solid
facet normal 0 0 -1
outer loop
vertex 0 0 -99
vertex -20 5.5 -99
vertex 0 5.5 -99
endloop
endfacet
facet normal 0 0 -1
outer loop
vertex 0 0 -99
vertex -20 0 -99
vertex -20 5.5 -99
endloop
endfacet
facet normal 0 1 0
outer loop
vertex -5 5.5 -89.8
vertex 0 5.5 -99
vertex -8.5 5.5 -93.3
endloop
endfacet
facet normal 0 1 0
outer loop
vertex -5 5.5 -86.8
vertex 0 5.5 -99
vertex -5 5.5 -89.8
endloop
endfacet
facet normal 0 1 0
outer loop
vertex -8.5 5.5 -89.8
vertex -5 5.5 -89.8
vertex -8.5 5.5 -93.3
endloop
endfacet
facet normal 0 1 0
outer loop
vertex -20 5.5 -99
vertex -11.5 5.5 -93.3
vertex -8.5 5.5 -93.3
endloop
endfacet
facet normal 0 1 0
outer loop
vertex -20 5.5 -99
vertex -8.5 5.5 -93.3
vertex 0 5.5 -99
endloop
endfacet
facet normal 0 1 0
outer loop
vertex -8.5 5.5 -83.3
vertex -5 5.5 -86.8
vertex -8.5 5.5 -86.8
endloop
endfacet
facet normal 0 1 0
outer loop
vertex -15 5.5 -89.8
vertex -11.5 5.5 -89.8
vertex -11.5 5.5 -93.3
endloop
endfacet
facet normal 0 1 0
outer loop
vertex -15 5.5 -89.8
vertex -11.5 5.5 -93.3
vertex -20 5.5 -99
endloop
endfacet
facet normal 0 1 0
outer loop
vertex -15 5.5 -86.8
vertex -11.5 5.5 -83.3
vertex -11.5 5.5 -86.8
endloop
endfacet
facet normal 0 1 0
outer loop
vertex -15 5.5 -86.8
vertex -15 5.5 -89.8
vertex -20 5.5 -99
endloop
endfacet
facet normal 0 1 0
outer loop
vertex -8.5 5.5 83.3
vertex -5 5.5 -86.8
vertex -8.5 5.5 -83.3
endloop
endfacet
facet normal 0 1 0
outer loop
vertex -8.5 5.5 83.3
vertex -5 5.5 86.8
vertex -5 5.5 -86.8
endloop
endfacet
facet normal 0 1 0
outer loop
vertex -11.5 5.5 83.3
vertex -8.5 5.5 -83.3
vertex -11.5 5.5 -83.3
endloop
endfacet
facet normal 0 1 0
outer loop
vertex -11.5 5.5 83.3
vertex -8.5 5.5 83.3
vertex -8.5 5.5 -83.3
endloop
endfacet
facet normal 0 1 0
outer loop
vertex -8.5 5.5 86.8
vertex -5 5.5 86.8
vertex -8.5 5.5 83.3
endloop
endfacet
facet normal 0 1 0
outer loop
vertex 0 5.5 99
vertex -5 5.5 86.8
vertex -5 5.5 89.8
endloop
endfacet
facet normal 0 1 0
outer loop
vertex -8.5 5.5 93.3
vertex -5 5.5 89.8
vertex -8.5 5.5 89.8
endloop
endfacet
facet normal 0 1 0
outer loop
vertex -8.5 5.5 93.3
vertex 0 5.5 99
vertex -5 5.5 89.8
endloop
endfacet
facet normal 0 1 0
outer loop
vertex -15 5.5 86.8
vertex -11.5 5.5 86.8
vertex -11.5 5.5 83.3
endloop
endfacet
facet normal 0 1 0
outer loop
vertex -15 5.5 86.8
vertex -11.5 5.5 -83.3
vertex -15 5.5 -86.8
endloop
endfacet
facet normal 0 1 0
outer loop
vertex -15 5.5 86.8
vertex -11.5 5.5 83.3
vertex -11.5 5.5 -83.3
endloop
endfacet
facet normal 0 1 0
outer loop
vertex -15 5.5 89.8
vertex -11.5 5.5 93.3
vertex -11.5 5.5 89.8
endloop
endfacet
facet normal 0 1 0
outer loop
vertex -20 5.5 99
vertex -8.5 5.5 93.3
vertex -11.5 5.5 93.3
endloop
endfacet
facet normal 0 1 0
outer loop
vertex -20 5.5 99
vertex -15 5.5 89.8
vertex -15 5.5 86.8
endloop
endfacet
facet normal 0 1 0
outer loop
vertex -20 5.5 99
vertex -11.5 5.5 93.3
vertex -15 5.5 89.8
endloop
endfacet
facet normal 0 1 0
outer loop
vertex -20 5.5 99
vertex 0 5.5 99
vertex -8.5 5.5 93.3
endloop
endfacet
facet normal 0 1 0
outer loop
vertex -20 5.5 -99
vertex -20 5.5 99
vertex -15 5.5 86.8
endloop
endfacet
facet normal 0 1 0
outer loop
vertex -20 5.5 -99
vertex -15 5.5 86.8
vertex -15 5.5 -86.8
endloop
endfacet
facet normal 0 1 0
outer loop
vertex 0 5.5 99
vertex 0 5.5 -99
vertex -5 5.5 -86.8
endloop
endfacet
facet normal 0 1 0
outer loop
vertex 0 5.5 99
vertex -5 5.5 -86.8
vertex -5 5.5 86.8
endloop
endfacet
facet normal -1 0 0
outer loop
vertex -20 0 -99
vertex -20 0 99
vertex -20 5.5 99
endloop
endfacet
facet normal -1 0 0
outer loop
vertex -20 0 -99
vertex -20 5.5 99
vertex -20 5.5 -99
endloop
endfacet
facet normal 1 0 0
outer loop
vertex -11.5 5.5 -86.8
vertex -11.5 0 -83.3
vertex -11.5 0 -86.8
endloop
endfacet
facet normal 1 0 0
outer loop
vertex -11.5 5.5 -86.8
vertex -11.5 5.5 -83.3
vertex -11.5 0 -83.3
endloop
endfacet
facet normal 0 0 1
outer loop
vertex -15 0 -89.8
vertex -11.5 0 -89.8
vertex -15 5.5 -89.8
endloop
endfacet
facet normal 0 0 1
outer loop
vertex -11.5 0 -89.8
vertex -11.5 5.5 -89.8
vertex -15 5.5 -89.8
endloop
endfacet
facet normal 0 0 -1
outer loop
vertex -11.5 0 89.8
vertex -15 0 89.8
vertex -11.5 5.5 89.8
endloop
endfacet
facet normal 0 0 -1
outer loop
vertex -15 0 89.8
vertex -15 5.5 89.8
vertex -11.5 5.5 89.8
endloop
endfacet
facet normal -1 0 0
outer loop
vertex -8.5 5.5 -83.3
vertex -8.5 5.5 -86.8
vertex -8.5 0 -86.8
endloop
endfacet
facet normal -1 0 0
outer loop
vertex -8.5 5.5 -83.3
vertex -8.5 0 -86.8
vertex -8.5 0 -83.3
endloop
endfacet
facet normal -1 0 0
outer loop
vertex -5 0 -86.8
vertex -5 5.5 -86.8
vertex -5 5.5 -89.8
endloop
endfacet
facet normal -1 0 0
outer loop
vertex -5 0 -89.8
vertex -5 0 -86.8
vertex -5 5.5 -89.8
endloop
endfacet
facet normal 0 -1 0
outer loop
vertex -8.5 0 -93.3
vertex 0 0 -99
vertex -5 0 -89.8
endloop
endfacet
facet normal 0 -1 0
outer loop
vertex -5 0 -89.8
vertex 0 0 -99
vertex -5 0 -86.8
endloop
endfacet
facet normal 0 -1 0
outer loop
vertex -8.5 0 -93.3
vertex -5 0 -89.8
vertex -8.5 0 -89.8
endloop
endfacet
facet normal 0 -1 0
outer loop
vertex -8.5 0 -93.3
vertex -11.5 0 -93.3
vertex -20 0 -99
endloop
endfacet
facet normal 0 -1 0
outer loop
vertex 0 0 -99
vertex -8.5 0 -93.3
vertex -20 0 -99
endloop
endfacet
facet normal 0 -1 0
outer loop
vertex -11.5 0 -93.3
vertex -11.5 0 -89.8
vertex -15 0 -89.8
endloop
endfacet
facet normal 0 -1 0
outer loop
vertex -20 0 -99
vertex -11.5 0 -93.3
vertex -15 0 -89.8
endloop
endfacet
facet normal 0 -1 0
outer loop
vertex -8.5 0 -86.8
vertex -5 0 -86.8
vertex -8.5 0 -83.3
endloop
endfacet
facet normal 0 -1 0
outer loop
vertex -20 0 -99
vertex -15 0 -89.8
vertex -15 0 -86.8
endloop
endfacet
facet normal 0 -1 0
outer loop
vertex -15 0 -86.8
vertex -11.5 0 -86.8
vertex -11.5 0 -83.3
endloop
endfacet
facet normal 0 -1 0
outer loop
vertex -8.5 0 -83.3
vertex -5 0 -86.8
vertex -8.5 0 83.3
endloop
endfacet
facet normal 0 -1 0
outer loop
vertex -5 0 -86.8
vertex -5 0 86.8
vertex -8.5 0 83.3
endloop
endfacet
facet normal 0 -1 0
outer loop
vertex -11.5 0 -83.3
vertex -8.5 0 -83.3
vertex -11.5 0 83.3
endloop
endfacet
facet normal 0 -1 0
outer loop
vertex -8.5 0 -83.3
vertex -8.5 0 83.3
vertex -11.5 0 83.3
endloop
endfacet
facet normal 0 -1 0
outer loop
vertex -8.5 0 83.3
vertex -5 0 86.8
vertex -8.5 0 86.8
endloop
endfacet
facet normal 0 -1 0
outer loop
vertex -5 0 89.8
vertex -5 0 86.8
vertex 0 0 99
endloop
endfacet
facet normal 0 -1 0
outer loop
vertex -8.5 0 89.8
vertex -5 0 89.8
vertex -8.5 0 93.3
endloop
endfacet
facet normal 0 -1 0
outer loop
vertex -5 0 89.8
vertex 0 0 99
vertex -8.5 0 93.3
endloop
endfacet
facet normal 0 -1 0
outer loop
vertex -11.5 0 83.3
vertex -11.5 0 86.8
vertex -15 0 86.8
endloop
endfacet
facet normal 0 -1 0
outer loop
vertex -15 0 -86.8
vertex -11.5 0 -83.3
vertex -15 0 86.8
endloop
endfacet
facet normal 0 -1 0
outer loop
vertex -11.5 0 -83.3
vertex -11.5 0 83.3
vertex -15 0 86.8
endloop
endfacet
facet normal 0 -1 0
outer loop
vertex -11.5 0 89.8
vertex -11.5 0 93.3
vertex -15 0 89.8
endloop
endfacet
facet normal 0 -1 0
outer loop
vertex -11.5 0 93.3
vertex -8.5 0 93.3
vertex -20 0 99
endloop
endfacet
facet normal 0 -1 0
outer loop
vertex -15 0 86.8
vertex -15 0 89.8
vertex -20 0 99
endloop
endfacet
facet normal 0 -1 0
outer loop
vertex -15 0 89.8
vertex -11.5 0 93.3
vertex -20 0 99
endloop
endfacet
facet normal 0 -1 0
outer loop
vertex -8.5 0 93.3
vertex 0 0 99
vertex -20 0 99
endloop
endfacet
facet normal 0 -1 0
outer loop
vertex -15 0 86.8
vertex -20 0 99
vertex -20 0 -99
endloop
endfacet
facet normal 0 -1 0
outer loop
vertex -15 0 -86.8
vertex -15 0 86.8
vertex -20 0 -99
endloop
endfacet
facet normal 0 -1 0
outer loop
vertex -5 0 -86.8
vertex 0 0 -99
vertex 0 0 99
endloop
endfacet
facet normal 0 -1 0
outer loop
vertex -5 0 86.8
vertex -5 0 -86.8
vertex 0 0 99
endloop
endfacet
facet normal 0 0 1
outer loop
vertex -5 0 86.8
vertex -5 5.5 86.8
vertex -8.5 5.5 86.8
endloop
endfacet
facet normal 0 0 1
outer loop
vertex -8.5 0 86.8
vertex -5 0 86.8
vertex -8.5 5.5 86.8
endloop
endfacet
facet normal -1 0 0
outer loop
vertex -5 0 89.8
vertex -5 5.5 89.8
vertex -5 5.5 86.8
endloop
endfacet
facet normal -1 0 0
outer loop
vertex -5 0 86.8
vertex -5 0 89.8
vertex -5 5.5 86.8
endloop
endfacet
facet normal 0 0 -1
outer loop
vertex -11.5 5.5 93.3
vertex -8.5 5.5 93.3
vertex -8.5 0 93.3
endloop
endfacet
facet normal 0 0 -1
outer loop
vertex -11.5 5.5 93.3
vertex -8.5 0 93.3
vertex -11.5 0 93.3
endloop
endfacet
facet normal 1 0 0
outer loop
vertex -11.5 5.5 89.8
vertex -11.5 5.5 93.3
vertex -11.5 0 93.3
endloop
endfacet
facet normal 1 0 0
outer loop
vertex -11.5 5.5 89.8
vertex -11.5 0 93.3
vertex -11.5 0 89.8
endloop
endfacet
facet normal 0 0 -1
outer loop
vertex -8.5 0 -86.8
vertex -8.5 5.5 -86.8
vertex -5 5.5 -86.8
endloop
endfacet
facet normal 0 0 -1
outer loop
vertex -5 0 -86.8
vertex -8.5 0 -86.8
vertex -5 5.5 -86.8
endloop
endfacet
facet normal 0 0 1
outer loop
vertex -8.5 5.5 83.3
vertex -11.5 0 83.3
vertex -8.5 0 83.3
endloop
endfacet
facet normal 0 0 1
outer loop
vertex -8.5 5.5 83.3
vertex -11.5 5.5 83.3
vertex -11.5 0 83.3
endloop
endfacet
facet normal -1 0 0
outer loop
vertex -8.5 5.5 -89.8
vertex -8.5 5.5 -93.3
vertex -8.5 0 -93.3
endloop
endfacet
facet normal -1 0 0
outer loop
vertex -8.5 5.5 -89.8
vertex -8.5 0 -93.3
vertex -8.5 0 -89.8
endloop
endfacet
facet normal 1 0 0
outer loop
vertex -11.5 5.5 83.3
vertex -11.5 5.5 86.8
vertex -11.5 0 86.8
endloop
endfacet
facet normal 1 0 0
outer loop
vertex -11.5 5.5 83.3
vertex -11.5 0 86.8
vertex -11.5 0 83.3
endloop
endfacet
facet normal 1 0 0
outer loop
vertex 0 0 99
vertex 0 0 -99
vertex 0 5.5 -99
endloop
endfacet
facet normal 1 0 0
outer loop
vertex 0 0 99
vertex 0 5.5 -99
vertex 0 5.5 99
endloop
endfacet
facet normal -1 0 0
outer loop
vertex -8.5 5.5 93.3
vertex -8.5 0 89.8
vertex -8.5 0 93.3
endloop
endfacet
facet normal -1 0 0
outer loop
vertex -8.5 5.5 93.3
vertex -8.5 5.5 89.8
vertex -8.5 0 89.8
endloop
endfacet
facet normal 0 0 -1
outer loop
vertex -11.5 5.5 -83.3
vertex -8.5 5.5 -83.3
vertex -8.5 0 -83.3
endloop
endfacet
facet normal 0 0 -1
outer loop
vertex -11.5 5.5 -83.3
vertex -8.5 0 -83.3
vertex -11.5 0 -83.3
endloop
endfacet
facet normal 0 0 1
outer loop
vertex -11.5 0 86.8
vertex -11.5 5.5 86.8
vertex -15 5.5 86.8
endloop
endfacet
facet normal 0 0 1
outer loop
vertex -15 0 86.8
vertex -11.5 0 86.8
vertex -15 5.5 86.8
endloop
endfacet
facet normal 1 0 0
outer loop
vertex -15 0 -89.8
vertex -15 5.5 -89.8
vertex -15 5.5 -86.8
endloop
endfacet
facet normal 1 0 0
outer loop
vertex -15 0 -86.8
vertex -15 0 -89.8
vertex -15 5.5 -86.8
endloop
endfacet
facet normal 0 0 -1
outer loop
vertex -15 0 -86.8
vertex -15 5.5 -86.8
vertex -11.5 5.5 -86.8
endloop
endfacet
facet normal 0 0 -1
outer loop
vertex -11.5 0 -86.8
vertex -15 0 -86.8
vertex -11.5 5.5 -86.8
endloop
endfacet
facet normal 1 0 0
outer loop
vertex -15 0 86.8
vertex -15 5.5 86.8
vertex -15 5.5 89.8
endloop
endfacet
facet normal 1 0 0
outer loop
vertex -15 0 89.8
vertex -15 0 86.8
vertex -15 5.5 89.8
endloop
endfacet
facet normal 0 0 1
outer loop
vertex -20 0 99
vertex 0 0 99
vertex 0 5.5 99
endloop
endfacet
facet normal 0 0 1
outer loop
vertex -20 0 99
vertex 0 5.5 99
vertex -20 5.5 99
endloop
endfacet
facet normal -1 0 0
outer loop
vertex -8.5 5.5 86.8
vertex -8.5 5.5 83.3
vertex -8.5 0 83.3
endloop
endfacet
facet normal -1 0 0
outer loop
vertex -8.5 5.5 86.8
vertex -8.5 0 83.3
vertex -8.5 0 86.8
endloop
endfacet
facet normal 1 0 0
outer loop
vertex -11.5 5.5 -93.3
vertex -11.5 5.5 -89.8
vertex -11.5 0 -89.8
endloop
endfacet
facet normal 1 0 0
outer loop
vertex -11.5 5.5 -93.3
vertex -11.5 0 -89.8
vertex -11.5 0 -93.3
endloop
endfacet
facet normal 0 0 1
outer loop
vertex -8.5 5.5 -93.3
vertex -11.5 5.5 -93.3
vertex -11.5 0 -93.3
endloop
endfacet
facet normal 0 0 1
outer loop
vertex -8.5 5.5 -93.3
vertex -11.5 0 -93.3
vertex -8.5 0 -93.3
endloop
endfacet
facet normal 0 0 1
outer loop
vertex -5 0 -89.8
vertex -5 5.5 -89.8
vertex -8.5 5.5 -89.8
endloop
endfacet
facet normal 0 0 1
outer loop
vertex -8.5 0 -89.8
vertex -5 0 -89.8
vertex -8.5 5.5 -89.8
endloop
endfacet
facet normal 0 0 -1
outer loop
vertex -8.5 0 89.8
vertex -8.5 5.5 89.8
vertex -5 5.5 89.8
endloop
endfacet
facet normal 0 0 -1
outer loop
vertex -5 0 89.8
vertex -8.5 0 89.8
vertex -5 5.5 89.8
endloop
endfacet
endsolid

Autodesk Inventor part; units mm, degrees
ref_plane "YZ Plane" through (0, 0, 0) normal (1, 0, 0) x (0, 1, 0)
ref_plane "XZ Plane" through (0, 0, 0) normal (0, 1, 0) x (-1, 0, 0)
ref_plane "XY Plane" through (0, 0, 0) normal (0, 0, 1) x (1, 0, 0)
sketch "スケッチ1" plane through (0, 0, 0) normal (0, 1, 0) x (-1, 0, 0)
  line L0 (0, 99) -> (20, 99)
  line L1 (20, 99) -> (20, -99)
  line L2 (20, -99) -> (0, -99)
  line L3 (0, -99) -> (0, 99)
  point P0 (0, 0)
  point P1 (0, 0)
  dimension "d0" = 198
  dimension "d1" = 20
extrude "押し出し1" add sketch "スケッチ1" along normal blind 5.5
sketch "スケッチ2" plane through (0, 5.5, 0) normal (0, 1, 0) x (1, 0, 0)
  line L0 (-15, -89.8) -> (-5, -89.8)
  line L1 (-5, -89.8) -> (-5, -86.8)
  line L2 (-5, -86.8) -> (-15, -86.8)
  line L3 (-15, -86.8) -> (-15, -89.8)
  line L4 (-8.5, -93.3) -> (-11.5, -93.3)
  line L5 (-11.5, -93.3) -> (-11.5, -83.3)
  line L6 (-11.5, -83.3) -> (-8.5, -83.3)
  line L7 (-8.5, -83.3) -> (-8.5, -93.3)
  line L8 (-20, -99) -> (0, -99) projected
  point P0 (0, 0)
  point P1 (-8.5, -88.3)
  point P2 (-15, -88.3)
  point P3 (-10, -93.3)
  point P4 (-10, -89.8)
  point P5 (-10, -99)
  point P6 (-8.5, -86.8)
  point P7 (-11.5, -86.8)
  point P8 (-11.5, -89.8)
  point P9 (-8.5, -89.8)
  point P10 (-10, -99)
  dimension "d4" = 10
  dimension "d5" = 5.7
  dimension "d6" = 3
extrude "押し出し2" cut sketch "スケッチ2" against normal through all
mirror "ミラー1" about plane through (0, 0, 0) normal (0, 0, 1) of "押し出し2"
properties part number "back_under" material "木材 (カエデ材)"
